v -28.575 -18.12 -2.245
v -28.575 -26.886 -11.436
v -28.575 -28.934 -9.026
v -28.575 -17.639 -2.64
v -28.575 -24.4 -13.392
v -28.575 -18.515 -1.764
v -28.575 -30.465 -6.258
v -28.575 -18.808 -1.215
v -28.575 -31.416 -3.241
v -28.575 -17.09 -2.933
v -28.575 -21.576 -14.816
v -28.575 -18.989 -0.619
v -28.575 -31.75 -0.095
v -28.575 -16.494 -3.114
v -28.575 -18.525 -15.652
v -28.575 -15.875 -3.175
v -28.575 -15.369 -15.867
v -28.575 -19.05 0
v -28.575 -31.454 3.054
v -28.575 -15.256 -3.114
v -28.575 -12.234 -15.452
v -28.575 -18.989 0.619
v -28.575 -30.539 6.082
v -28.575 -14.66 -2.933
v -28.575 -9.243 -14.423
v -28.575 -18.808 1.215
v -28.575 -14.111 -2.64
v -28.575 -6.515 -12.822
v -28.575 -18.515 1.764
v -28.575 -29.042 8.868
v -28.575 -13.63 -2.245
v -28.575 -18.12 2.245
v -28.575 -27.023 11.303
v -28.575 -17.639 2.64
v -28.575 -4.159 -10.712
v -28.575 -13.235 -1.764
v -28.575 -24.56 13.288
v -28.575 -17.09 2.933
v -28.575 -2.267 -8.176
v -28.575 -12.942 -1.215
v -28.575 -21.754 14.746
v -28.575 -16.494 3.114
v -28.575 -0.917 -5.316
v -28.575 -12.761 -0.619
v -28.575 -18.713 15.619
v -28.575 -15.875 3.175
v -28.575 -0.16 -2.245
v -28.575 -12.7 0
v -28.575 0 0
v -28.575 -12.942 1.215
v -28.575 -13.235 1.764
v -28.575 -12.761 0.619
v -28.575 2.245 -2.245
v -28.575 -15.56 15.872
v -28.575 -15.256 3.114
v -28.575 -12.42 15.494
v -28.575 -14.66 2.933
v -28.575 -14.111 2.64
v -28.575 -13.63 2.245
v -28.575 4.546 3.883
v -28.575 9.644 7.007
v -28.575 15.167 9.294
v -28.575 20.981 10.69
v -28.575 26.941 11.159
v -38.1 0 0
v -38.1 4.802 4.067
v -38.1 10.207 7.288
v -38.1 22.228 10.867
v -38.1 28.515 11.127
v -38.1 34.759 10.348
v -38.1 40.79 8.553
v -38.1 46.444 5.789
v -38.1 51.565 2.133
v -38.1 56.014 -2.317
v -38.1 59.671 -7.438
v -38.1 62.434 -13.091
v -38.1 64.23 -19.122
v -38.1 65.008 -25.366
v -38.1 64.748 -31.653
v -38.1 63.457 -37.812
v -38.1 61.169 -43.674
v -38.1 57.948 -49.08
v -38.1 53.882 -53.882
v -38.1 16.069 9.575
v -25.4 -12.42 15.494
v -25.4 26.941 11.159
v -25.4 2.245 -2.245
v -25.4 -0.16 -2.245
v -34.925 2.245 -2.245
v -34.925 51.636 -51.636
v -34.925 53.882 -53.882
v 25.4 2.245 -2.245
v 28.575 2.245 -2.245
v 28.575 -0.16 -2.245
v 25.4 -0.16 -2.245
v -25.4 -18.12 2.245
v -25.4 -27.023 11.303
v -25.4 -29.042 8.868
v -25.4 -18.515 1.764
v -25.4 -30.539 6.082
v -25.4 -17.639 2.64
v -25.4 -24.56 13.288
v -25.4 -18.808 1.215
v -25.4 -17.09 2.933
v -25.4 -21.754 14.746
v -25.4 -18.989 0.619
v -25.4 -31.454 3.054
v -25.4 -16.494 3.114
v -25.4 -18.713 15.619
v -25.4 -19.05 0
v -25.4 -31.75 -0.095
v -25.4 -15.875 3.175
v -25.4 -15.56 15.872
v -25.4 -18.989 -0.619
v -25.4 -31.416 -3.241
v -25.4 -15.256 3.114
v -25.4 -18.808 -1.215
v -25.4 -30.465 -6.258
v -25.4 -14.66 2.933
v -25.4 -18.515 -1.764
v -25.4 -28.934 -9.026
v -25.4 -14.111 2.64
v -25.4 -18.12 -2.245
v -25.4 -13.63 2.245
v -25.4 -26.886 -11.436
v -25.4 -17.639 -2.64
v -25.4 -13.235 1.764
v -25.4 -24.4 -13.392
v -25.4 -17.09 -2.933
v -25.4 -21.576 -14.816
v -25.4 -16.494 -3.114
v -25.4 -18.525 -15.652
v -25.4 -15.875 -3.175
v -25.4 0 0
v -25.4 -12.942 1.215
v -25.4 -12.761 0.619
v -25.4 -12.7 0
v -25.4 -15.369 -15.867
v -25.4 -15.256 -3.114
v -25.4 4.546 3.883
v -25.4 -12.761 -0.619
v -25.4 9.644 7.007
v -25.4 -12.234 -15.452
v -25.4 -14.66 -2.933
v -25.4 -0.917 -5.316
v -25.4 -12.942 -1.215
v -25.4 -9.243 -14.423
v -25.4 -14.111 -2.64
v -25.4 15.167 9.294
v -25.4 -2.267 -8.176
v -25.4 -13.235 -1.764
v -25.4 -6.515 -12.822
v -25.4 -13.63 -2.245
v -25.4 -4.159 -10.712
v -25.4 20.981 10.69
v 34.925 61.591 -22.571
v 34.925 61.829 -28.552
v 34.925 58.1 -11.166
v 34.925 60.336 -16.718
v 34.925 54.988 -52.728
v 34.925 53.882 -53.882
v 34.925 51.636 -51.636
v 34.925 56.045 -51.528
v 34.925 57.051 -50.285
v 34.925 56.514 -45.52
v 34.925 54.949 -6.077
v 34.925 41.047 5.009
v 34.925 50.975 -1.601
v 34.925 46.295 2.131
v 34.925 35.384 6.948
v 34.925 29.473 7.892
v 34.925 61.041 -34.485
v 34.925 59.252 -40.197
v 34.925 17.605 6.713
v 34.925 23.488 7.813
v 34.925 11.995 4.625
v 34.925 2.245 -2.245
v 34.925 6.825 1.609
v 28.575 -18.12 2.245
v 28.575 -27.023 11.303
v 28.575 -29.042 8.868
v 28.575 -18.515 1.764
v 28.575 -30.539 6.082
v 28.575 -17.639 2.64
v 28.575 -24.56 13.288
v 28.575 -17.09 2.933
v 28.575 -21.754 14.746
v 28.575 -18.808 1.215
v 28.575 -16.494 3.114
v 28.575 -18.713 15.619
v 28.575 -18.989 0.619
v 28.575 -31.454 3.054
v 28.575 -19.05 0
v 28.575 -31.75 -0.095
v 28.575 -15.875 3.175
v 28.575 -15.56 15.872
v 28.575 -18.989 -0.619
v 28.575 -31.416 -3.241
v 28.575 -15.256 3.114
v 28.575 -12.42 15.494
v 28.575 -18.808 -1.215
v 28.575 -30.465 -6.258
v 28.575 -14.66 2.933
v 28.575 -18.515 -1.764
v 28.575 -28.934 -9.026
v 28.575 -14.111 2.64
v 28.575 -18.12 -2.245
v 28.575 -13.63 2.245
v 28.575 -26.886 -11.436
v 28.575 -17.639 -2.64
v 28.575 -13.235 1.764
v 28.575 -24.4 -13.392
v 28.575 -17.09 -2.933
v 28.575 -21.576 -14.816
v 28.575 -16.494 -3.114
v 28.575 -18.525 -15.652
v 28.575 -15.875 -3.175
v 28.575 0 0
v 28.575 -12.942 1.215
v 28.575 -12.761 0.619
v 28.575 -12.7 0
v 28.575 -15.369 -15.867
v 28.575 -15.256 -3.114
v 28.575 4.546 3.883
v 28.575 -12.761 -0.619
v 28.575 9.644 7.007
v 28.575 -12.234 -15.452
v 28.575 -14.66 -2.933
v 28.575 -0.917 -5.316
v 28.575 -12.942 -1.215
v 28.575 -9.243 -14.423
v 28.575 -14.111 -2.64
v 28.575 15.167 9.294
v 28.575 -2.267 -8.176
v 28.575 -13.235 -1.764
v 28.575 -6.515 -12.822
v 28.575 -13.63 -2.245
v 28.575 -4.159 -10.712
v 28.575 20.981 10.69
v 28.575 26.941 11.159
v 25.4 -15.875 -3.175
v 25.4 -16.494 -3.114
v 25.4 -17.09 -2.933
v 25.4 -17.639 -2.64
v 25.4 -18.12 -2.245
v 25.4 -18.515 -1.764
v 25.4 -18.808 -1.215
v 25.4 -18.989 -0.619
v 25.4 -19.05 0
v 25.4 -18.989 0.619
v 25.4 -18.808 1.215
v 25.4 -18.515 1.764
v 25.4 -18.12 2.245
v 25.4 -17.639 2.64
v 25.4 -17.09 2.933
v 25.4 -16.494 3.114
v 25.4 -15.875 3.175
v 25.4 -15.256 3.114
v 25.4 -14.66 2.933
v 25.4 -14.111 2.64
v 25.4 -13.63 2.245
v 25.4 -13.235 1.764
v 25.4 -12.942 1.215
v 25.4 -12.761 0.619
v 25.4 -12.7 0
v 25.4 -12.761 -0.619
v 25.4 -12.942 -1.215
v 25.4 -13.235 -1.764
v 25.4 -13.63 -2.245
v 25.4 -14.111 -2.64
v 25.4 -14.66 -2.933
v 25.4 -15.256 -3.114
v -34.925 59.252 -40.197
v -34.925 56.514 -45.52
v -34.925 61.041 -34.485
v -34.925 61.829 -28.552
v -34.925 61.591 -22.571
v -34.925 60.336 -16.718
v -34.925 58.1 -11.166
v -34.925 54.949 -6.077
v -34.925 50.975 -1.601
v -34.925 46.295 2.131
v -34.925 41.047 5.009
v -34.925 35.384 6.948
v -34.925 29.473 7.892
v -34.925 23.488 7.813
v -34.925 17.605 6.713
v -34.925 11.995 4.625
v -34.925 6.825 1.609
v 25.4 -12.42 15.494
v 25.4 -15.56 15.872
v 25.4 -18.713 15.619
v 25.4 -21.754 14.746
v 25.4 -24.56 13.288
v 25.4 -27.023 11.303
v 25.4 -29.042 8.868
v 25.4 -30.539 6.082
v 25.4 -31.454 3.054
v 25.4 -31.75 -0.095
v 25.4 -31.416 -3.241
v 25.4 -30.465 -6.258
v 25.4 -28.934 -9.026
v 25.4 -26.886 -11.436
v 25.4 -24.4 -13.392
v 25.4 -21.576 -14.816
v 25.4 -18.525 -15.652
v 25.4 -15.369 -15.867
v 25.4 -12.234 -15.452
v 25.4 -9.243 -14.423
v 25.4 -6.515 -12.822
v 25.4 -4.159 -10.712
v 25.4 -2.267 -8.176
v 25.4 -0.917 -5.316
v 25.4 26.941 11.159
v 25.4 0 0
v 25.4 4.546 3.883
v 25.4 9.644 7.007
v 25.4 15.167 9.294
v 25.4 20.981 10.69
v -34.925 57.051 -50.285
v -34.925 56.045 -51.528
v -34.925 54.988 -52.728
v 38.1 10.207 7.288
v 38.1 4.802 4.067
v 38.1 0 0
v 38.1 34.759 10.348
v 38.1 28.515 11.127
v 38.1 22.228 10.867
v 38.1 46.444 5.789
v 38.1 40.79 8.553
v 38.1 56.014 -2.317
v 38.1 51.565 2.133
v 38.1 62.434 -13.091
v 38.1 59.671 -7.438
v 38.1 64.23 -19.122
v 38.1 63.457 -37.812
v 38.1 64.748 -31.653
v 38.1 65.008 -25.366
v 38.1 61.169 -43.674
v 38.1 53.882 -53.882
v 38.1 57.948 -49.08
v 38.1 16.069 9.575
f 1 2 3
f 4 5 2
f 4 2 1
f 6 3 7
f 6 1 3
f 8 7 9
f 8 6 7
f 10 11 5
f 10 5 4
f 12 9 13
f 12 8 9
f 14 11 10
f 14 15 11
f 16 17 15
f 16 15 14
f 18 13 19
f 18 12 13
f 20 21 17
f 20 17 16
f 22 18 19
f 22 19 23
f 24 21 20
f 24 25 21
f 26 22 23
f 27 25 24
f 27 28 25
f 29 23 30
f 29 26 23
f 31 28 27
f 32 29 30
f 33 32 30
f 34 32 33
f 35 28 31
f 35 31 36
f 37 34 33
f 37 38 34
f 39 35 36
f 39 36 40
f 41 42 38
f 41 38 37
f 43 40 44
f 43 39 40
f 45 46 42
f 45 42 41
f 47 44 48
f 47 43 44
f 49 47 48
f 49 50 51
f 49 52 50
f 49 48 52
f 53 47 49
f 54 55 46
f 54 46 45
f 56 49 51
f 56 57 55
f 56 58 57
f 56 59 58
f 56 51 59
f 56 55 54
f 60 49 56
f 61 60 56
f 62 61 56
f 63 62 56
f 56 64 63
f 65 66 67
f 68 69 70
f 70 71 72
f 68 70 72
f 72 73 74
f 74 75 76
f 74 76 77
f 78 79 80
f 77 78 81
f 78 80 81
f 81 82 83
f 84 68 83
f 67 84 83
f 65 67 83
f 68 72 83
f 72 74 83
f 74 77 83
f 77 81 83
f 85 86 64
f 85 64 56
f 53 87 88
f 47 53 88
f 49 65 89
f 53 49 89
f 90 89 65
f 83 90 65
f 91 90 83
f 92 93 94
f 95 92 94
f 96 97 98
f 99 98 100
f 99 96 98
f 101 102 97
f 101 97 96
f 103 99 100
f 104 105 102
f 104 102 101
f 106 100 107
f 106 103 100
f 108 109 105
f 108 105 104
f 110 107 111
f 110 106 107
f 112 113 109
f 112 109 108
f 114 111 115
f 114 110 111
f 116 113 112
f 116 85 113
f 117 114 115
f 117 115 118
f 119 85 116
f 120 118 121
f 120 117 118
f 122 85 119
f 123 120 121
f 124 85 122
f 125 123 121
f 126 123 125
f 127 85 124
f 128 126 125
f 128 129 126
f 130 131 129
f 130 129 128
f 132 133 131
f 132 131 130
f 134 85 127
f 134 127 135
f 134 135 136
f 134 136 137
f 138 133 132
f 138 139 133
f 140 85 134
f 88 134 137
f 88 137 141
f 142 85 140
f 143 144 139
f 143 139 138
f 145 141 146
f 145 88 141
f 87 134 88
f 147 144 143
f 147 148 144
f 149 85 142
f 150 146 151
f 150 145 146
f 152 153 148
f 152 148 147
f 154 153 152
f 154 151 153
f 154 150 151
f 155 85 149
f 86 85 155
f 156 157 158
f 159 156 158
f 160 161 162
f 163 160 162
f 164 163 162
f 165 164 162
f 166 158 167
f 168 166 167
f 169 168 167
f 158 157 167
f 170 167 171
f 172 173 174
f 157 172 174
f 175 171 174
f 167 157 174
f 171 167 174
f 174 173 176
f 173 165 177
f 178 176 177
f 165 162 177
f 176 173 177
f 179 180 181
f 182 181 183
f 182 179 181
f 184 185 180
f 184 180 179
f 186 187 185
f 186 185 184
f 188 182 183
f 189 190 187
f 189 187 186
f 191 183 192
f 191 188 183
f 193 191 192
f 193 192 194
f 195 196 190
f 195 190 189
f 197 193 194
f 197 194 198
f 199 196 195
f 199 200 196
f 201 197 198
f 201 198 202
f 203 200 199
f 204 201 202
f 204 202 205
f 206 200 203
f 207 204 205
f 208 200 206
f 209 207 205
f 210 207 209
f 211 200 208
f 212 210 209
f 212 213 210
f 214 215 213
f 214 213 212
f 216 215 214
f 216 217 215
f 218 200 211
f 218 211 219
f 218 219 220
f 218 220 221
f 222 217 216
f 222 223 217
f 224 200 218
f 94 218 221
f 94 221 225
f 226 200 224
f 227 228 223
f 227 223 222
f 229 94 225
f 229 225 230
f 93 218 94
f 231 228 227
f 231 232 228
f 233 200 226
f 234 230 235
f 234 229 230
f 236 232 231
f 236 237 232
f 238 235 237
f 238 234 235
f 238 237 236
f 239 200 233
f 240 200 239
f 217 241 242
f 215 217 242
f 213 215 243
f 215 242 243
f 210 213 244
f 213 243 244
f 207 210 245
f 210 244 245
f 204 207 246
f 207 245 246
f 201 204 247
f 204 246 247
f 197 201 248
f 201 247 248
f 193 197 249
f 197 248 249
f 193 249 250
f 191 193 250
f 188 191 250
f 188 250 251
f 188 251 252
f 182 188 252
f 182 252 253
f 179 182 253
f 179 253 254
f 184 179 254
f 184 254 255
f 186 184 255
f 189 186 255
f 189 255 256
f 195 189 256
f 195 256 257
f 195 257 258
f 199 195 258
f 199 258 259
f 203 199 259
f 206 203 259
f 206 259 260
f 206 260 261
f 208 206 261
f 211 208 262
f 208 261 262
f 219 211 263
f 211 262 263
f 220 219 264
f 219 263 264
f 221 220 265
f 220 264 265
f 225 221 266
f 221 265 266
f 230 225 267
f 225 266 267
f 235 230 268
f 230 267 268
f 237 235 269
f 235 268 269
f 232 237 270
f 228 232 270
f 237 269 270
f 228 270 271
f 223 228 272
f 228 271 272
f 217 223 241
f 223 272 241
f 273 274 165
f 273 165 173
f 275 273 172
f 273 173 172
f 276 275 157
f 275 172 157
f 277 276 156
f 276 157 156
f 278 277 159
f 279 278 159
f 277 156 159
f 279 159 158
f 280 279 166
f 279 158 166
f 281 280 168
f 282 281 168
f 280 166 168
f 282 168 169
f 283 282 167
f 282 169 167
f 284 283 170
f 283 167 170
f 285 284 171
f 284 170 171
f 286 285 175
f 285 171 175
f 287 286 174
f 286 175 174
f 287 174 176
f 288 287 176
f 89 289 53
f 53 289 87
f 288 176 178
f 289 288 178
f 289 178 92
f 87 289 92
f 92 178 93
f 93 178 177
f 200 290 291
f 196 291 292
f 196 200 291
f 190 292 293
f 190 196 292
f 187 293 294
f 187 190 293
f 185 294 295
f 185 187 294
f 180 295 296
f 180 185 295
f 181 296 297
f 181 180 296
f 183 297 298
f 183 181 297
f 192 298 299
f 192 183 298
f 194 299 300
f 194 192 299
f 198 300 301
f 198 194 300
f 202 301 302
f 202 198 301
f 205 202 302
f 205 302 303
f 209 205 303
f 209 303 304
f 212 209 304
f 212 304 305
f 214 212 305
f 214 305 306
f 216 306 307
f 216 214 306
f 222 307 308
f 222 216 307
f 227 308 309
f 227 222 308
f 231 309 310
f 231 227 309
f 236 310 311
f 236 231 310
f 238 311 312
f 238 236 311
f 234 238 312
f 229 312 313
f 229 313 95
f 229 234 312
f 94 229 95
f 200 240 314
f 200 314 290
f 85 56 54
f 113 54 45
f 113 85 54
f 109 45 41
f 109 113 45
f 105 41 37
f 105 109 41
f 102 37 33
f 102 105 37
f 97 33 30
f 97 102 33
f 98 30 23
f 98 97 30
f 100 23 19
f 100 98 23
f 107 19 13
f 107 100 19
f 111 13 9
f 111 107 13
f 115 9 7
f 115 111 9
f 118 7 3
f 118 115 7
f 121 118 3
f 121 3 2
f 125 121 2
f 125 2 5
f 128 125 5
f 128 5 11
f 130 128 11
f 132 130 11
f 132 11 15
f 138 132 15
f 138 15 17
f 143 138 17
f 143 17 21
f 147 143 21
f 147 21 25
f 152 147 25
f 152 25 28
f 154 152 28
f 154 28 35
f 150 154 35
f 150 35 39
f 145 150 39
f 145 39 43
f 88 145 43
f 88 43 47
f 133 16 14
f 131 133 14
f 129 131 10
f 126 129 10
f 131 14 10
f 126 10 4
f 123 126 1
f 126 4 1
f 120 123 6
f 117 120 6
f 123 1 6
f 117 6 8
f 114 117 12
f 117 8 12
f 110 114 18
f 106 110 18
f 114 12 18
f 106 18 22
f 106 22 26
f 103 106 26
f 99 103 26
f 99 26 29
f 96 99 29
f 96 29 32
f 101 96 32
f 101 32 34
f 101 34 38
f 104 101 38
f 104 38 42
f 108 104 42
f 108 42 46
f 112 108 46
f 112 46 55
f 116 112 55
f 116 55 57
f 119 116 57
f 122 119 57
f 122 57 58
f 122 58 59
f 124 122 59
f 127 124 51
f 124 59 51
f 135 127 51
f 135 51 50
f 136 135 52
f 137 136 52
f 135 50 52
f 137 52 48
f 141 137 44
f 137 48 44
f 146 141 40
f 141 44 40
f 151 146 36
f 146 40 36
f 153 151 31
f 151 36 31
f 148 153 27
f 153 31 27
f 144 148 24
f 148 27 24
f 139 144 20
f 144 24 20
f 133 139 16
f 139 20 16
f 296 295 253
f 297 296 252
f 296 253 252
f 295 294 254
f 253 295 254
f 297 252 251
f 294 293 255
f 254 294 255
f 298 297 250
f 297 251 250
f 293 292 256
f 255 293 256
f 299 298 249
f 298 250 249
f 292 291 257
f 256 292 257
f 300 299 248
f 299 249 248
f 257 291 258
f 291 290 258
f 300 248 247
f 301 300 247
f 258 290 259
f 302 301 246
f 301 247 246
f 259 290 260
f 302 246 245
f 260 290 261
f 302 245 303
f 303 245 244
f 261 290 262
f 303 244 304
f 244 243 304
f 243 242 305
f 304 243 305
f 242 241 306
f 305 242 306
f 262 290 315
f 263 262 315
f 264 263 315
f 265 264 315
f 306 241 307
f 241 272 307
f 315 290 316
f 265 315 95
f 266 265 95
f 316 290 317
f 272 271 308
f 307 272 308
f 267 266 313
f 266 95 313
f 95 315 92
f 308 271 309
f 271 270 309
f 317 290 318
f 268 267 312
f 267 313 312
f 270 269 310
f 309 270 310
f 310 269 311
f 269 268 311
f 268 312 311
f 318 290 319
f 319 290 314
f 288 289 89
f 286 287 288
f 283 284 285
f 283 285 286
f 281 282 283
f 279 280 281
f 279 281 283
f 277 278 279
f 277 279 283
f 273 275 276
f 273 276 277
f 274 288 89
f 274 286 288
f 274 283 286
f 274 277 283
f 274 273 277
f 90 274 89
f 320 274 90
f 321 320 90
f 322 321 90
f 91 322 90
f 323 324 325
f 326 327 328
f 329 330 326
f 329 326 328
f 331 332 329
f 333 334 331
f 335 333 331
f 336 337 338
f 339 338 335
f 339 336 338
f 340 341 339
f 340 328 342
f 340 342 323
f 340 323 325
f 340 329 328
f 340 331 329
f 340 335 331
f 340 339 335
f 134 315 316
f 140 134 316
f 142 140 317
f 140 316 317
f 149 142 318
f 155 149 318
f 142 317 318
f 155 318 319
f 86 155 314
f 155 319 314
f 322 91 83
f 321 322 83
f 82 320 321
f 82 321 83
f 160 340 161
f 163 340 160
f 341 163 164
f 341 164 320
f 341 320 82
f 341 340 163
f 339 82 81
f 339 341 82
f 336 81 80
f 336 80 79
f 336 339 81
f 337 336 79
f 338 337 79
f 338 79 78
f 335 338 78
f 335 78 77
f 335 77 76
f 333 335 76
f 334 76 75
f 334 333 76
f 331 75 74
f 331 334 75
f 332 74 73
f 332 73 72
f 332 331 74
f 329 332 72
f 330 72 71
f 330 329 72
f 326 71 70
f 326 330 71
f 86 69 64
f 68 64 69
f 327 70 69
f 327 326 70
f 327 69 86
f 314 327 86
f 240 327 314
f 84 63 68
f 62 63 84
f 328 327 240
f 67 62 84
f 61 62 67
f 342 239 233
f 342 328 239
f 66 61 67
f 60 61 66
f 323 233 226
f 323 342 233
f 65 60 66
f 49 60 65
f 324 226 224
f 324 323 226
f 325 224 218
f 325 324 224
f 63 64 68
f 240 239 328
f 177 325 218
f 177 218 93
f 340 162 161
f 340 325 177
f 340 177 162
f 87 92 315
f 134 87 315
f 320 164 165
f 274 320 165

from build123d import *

# Parameters (mm, degrees)
BOSS_EXTRUDE1_DEPTH = 38.1
SHELL1_T            = -3.175
SKETCH4_R           = 15.875
BOSS_EXTRUDE3_DEPTH = 28.575
BOSS_EXTRUDE4_DEPTH = 28.575
SKETCH6_R           = 15.875
CUT_EXTRUDE2_DEPTH  = 25.4
CUT_EXTRUDE3_START  = 25.4
SKETCH6_2_R         = 15.875
CUT_EXTRUDE3_DEPTH  = 25.4
CUT_EXTRUDE4_REACH  = 109.606
SKETCH7_R           = 3.175
BOSS_EXTRUDE5_REACH = 109.606
CUT_EXTRUDE5_DEPTH  = 25.4


with BuildPart() as part:
    # Sketch2 → Boss-Extrude1 (new, symmetric)
    with BuildSketch(Plane(origin=(0, 0, 0), x_dir=(0, 0, -1), z_dir=(1, 0, 0))):
        with BuildLine():
            Line((0, 0), (53.881536726, 53.881536726))
            ThreePointArc((53.881536726, 53.881536726), (0, 53.881536726), (0, 0))
        make_face()
    extrude(amount=BOSS_EXTRUDE1_DEPTH, both=True)

    # Shell1
    shell1_openings = [part.faces().sort_by_distance(p)[0] for p in [
        (0, 26.940768363, -26.940768363),
    ]]
    offset(amount=SHELL1_T, openings=shell1_openings)

    # Chamfer1
    # the kernel refuses this chamfer: 10 mm, written as the material it takes off along each edge
    with BuildSketch(Plane(origin=(34.925, 51.636472696, -51.636472696), x_dir=(0, 0.6876558872178, -0.726036762688158), z_dir=(-1, 0, 0))) as chamfer1_piece_1:
        with BuildLine():
            Line((8.869626963, -0.240804851), (-1.086879529, -7.747424349))
            ThreePointArc((-1.086879529, -7.747424349), (-0.345966855, -4.045712731), (0, 0))
            Line((0, 0), (8.869626963, -0.240804851))
        make_face()
    extrude(amount=69.85, mode=Mode.SUBTRACT)



with BuildPart() as body_2:
    # Sketch4 → Boss-Extrude3 (new, symmetric)
    with BuildSketch(Plane(origin=(0, 0, 0), x_dir=(0, 0, -1), z_dir=(1, 0, 0))):
        with Locations((0, -15.875)):
            Circle(SKETCH4_R)
    extrude(amount=BOSS_EXTRUDE3_DEPTH, both=True)


with BuildPart() as part_1:
    add(part.part)

    add(body_2.part)  # Boss-Extrude4 merges body 2
    # Sketch5 → Boss-Extrude4 (add, symmetric)
    with BuildSketch(Plane(origin=(0, 0, 0), x_dir=(0, 0, -1), z_dir=(1, 0, 0))):
        Polygon((2.24506403, 2.24506403), (2.24506403, -0.159551788), (0, 0), align=None)
    extrude(amount=BOSS_EXTRUDE4_DEPTH, both=True)

    # Sketch6 → Cut-Extrude2 (cut)
    with BuildSketch(Plane(origin=(0, 0, 0), x_dir=(0, 0, -1), z_dir=(1, 0, 0))):
        with Locations((0, -15.875)):
            Circle(SKETCH6_R)
    extrude(amount=-CUT_EXTRUDE2_DEPTH, mode=Mode.SUBTRACT)

    # Sketch6<2> → Cut-Extrude3 (cut)
    with BuildSketch(Plane(origin=(0, 0, 0), x_dir=(0, 0, -1), z_dir=(1, 0, 0)).offset(CUT_EXTRUDE3_START)):
        with Locations((0, -15.875)):
            Circle(SKETCH6_2_R)
    extrude(amount=-CUT_EXTRUDE3_DEPTH, mode=Mode.SUBTRACT)

    # Cut-Extrude4: up to this face of the body (flat: up to its plane)
    cut_extrude4_end = Plane(part_1.part.faces().sort_by_distance((28.575, -15.819887854, -0.005001009))[0])
    # Sketch7 → Cut-Extrude4 (cut, up to the picked face)
    with BuildSketch(Plane.ZY.offset(28.575), mode=Mode.PRIVATE) as cut_extrude4_sk1:
        with Locations(Location((0, -15.875, 0), (0, 0, 180))):
            Circle(SKETCH7_R)
    cut_extrude4_tool1 = split(extrude(cut_extrude4_sk1.sketch, amount=-CUT_EXTRUDE4_REACH, mode=Mode.PRIVATE), bisect_by=cut_extrude4_end, keep=Keep.BOTH, mode=Mode.PRIVATE)
    add(cut_extrude4_tool1.solids().sort_by(Axis((-28.575, -15.875, 0), (1, 0, 0)))[0], mode=Mode.SUBTRACT)

    # Boss-Extrude5: up to this face of the body (flat: up to its plane)
    boss_extrude5_end = Plane(part_1.part.faces().sort_by_distance((-28.575, 0.79361509, -1.451448941))[0])
    # Sketch8 → Boss-Extrude5 (add, up to the picked face)
    with BuildSketch(Plane(origin=(28.575, 0, 0), x_dir=(0, 0, -1), z_dir=(1, 0, 0)), mode=Mode.PRIVATE) as boss_extrude5_sk1:
        with BuildLine():
            Line((-11.159231637, 26.940768363), (-15.875, -15.875))
            Line((-15.875, -15.875), (2.24506403, 2.24506403))
            ThreePointArc((2.24506403, 2.24506403), (-3.75420071, 10.280201189), (-7.223023717, 19.688807544))
            Line((-7.223023717, 19.688807544), (-11.159231637, 26.940768363))
        make_face()
    boss_extrude5_tool1 = split(extrude(boss_extrude5_sk1.sketch, amount=-BOSS_EXTRUDE5_REACH, mode=Mode.PRIVATE), bisect_by=boss_extrude5_end, keep=Keep.BOTH, mode=Mode.PRIVATE)
    add(boss_extrude5_tool1.solids().sort_by(Axis((28.575, 4.070009, 8.572047), (-1, 0, 0)))[0])

    # Sketch9 → Cut-Extrude5 (cut, symmetric)
    with BuildSketch(Plane(origin=(0, 0, 0), x_dir=(0, 0, -1), z_dir=(1, 0, 0))):
        with BuildLine():
            Line((2.24506403, -0.159551788), (2.24506403, 2.24506403))
            Line((2.24506403, 2.24506403), (0, 0))
            ThreePointArc((0, 0), (-8.259041825, 12.36052959), (-11.159231637, 26.940768363))
            Line((-11.159231637, 26.940768363), (-15.494456387, -12.419939034))
            ThreePointArc((-15.494456387, -12.419939034), (9.025844742, -28.934469809), (2.24506403, -0.159551788))
        make_face()
    extrude(amount=CUT_EXTRUDE5_DEPTH, both=True, mode=Mode.SUBTRACT)


solid = part_1.part
